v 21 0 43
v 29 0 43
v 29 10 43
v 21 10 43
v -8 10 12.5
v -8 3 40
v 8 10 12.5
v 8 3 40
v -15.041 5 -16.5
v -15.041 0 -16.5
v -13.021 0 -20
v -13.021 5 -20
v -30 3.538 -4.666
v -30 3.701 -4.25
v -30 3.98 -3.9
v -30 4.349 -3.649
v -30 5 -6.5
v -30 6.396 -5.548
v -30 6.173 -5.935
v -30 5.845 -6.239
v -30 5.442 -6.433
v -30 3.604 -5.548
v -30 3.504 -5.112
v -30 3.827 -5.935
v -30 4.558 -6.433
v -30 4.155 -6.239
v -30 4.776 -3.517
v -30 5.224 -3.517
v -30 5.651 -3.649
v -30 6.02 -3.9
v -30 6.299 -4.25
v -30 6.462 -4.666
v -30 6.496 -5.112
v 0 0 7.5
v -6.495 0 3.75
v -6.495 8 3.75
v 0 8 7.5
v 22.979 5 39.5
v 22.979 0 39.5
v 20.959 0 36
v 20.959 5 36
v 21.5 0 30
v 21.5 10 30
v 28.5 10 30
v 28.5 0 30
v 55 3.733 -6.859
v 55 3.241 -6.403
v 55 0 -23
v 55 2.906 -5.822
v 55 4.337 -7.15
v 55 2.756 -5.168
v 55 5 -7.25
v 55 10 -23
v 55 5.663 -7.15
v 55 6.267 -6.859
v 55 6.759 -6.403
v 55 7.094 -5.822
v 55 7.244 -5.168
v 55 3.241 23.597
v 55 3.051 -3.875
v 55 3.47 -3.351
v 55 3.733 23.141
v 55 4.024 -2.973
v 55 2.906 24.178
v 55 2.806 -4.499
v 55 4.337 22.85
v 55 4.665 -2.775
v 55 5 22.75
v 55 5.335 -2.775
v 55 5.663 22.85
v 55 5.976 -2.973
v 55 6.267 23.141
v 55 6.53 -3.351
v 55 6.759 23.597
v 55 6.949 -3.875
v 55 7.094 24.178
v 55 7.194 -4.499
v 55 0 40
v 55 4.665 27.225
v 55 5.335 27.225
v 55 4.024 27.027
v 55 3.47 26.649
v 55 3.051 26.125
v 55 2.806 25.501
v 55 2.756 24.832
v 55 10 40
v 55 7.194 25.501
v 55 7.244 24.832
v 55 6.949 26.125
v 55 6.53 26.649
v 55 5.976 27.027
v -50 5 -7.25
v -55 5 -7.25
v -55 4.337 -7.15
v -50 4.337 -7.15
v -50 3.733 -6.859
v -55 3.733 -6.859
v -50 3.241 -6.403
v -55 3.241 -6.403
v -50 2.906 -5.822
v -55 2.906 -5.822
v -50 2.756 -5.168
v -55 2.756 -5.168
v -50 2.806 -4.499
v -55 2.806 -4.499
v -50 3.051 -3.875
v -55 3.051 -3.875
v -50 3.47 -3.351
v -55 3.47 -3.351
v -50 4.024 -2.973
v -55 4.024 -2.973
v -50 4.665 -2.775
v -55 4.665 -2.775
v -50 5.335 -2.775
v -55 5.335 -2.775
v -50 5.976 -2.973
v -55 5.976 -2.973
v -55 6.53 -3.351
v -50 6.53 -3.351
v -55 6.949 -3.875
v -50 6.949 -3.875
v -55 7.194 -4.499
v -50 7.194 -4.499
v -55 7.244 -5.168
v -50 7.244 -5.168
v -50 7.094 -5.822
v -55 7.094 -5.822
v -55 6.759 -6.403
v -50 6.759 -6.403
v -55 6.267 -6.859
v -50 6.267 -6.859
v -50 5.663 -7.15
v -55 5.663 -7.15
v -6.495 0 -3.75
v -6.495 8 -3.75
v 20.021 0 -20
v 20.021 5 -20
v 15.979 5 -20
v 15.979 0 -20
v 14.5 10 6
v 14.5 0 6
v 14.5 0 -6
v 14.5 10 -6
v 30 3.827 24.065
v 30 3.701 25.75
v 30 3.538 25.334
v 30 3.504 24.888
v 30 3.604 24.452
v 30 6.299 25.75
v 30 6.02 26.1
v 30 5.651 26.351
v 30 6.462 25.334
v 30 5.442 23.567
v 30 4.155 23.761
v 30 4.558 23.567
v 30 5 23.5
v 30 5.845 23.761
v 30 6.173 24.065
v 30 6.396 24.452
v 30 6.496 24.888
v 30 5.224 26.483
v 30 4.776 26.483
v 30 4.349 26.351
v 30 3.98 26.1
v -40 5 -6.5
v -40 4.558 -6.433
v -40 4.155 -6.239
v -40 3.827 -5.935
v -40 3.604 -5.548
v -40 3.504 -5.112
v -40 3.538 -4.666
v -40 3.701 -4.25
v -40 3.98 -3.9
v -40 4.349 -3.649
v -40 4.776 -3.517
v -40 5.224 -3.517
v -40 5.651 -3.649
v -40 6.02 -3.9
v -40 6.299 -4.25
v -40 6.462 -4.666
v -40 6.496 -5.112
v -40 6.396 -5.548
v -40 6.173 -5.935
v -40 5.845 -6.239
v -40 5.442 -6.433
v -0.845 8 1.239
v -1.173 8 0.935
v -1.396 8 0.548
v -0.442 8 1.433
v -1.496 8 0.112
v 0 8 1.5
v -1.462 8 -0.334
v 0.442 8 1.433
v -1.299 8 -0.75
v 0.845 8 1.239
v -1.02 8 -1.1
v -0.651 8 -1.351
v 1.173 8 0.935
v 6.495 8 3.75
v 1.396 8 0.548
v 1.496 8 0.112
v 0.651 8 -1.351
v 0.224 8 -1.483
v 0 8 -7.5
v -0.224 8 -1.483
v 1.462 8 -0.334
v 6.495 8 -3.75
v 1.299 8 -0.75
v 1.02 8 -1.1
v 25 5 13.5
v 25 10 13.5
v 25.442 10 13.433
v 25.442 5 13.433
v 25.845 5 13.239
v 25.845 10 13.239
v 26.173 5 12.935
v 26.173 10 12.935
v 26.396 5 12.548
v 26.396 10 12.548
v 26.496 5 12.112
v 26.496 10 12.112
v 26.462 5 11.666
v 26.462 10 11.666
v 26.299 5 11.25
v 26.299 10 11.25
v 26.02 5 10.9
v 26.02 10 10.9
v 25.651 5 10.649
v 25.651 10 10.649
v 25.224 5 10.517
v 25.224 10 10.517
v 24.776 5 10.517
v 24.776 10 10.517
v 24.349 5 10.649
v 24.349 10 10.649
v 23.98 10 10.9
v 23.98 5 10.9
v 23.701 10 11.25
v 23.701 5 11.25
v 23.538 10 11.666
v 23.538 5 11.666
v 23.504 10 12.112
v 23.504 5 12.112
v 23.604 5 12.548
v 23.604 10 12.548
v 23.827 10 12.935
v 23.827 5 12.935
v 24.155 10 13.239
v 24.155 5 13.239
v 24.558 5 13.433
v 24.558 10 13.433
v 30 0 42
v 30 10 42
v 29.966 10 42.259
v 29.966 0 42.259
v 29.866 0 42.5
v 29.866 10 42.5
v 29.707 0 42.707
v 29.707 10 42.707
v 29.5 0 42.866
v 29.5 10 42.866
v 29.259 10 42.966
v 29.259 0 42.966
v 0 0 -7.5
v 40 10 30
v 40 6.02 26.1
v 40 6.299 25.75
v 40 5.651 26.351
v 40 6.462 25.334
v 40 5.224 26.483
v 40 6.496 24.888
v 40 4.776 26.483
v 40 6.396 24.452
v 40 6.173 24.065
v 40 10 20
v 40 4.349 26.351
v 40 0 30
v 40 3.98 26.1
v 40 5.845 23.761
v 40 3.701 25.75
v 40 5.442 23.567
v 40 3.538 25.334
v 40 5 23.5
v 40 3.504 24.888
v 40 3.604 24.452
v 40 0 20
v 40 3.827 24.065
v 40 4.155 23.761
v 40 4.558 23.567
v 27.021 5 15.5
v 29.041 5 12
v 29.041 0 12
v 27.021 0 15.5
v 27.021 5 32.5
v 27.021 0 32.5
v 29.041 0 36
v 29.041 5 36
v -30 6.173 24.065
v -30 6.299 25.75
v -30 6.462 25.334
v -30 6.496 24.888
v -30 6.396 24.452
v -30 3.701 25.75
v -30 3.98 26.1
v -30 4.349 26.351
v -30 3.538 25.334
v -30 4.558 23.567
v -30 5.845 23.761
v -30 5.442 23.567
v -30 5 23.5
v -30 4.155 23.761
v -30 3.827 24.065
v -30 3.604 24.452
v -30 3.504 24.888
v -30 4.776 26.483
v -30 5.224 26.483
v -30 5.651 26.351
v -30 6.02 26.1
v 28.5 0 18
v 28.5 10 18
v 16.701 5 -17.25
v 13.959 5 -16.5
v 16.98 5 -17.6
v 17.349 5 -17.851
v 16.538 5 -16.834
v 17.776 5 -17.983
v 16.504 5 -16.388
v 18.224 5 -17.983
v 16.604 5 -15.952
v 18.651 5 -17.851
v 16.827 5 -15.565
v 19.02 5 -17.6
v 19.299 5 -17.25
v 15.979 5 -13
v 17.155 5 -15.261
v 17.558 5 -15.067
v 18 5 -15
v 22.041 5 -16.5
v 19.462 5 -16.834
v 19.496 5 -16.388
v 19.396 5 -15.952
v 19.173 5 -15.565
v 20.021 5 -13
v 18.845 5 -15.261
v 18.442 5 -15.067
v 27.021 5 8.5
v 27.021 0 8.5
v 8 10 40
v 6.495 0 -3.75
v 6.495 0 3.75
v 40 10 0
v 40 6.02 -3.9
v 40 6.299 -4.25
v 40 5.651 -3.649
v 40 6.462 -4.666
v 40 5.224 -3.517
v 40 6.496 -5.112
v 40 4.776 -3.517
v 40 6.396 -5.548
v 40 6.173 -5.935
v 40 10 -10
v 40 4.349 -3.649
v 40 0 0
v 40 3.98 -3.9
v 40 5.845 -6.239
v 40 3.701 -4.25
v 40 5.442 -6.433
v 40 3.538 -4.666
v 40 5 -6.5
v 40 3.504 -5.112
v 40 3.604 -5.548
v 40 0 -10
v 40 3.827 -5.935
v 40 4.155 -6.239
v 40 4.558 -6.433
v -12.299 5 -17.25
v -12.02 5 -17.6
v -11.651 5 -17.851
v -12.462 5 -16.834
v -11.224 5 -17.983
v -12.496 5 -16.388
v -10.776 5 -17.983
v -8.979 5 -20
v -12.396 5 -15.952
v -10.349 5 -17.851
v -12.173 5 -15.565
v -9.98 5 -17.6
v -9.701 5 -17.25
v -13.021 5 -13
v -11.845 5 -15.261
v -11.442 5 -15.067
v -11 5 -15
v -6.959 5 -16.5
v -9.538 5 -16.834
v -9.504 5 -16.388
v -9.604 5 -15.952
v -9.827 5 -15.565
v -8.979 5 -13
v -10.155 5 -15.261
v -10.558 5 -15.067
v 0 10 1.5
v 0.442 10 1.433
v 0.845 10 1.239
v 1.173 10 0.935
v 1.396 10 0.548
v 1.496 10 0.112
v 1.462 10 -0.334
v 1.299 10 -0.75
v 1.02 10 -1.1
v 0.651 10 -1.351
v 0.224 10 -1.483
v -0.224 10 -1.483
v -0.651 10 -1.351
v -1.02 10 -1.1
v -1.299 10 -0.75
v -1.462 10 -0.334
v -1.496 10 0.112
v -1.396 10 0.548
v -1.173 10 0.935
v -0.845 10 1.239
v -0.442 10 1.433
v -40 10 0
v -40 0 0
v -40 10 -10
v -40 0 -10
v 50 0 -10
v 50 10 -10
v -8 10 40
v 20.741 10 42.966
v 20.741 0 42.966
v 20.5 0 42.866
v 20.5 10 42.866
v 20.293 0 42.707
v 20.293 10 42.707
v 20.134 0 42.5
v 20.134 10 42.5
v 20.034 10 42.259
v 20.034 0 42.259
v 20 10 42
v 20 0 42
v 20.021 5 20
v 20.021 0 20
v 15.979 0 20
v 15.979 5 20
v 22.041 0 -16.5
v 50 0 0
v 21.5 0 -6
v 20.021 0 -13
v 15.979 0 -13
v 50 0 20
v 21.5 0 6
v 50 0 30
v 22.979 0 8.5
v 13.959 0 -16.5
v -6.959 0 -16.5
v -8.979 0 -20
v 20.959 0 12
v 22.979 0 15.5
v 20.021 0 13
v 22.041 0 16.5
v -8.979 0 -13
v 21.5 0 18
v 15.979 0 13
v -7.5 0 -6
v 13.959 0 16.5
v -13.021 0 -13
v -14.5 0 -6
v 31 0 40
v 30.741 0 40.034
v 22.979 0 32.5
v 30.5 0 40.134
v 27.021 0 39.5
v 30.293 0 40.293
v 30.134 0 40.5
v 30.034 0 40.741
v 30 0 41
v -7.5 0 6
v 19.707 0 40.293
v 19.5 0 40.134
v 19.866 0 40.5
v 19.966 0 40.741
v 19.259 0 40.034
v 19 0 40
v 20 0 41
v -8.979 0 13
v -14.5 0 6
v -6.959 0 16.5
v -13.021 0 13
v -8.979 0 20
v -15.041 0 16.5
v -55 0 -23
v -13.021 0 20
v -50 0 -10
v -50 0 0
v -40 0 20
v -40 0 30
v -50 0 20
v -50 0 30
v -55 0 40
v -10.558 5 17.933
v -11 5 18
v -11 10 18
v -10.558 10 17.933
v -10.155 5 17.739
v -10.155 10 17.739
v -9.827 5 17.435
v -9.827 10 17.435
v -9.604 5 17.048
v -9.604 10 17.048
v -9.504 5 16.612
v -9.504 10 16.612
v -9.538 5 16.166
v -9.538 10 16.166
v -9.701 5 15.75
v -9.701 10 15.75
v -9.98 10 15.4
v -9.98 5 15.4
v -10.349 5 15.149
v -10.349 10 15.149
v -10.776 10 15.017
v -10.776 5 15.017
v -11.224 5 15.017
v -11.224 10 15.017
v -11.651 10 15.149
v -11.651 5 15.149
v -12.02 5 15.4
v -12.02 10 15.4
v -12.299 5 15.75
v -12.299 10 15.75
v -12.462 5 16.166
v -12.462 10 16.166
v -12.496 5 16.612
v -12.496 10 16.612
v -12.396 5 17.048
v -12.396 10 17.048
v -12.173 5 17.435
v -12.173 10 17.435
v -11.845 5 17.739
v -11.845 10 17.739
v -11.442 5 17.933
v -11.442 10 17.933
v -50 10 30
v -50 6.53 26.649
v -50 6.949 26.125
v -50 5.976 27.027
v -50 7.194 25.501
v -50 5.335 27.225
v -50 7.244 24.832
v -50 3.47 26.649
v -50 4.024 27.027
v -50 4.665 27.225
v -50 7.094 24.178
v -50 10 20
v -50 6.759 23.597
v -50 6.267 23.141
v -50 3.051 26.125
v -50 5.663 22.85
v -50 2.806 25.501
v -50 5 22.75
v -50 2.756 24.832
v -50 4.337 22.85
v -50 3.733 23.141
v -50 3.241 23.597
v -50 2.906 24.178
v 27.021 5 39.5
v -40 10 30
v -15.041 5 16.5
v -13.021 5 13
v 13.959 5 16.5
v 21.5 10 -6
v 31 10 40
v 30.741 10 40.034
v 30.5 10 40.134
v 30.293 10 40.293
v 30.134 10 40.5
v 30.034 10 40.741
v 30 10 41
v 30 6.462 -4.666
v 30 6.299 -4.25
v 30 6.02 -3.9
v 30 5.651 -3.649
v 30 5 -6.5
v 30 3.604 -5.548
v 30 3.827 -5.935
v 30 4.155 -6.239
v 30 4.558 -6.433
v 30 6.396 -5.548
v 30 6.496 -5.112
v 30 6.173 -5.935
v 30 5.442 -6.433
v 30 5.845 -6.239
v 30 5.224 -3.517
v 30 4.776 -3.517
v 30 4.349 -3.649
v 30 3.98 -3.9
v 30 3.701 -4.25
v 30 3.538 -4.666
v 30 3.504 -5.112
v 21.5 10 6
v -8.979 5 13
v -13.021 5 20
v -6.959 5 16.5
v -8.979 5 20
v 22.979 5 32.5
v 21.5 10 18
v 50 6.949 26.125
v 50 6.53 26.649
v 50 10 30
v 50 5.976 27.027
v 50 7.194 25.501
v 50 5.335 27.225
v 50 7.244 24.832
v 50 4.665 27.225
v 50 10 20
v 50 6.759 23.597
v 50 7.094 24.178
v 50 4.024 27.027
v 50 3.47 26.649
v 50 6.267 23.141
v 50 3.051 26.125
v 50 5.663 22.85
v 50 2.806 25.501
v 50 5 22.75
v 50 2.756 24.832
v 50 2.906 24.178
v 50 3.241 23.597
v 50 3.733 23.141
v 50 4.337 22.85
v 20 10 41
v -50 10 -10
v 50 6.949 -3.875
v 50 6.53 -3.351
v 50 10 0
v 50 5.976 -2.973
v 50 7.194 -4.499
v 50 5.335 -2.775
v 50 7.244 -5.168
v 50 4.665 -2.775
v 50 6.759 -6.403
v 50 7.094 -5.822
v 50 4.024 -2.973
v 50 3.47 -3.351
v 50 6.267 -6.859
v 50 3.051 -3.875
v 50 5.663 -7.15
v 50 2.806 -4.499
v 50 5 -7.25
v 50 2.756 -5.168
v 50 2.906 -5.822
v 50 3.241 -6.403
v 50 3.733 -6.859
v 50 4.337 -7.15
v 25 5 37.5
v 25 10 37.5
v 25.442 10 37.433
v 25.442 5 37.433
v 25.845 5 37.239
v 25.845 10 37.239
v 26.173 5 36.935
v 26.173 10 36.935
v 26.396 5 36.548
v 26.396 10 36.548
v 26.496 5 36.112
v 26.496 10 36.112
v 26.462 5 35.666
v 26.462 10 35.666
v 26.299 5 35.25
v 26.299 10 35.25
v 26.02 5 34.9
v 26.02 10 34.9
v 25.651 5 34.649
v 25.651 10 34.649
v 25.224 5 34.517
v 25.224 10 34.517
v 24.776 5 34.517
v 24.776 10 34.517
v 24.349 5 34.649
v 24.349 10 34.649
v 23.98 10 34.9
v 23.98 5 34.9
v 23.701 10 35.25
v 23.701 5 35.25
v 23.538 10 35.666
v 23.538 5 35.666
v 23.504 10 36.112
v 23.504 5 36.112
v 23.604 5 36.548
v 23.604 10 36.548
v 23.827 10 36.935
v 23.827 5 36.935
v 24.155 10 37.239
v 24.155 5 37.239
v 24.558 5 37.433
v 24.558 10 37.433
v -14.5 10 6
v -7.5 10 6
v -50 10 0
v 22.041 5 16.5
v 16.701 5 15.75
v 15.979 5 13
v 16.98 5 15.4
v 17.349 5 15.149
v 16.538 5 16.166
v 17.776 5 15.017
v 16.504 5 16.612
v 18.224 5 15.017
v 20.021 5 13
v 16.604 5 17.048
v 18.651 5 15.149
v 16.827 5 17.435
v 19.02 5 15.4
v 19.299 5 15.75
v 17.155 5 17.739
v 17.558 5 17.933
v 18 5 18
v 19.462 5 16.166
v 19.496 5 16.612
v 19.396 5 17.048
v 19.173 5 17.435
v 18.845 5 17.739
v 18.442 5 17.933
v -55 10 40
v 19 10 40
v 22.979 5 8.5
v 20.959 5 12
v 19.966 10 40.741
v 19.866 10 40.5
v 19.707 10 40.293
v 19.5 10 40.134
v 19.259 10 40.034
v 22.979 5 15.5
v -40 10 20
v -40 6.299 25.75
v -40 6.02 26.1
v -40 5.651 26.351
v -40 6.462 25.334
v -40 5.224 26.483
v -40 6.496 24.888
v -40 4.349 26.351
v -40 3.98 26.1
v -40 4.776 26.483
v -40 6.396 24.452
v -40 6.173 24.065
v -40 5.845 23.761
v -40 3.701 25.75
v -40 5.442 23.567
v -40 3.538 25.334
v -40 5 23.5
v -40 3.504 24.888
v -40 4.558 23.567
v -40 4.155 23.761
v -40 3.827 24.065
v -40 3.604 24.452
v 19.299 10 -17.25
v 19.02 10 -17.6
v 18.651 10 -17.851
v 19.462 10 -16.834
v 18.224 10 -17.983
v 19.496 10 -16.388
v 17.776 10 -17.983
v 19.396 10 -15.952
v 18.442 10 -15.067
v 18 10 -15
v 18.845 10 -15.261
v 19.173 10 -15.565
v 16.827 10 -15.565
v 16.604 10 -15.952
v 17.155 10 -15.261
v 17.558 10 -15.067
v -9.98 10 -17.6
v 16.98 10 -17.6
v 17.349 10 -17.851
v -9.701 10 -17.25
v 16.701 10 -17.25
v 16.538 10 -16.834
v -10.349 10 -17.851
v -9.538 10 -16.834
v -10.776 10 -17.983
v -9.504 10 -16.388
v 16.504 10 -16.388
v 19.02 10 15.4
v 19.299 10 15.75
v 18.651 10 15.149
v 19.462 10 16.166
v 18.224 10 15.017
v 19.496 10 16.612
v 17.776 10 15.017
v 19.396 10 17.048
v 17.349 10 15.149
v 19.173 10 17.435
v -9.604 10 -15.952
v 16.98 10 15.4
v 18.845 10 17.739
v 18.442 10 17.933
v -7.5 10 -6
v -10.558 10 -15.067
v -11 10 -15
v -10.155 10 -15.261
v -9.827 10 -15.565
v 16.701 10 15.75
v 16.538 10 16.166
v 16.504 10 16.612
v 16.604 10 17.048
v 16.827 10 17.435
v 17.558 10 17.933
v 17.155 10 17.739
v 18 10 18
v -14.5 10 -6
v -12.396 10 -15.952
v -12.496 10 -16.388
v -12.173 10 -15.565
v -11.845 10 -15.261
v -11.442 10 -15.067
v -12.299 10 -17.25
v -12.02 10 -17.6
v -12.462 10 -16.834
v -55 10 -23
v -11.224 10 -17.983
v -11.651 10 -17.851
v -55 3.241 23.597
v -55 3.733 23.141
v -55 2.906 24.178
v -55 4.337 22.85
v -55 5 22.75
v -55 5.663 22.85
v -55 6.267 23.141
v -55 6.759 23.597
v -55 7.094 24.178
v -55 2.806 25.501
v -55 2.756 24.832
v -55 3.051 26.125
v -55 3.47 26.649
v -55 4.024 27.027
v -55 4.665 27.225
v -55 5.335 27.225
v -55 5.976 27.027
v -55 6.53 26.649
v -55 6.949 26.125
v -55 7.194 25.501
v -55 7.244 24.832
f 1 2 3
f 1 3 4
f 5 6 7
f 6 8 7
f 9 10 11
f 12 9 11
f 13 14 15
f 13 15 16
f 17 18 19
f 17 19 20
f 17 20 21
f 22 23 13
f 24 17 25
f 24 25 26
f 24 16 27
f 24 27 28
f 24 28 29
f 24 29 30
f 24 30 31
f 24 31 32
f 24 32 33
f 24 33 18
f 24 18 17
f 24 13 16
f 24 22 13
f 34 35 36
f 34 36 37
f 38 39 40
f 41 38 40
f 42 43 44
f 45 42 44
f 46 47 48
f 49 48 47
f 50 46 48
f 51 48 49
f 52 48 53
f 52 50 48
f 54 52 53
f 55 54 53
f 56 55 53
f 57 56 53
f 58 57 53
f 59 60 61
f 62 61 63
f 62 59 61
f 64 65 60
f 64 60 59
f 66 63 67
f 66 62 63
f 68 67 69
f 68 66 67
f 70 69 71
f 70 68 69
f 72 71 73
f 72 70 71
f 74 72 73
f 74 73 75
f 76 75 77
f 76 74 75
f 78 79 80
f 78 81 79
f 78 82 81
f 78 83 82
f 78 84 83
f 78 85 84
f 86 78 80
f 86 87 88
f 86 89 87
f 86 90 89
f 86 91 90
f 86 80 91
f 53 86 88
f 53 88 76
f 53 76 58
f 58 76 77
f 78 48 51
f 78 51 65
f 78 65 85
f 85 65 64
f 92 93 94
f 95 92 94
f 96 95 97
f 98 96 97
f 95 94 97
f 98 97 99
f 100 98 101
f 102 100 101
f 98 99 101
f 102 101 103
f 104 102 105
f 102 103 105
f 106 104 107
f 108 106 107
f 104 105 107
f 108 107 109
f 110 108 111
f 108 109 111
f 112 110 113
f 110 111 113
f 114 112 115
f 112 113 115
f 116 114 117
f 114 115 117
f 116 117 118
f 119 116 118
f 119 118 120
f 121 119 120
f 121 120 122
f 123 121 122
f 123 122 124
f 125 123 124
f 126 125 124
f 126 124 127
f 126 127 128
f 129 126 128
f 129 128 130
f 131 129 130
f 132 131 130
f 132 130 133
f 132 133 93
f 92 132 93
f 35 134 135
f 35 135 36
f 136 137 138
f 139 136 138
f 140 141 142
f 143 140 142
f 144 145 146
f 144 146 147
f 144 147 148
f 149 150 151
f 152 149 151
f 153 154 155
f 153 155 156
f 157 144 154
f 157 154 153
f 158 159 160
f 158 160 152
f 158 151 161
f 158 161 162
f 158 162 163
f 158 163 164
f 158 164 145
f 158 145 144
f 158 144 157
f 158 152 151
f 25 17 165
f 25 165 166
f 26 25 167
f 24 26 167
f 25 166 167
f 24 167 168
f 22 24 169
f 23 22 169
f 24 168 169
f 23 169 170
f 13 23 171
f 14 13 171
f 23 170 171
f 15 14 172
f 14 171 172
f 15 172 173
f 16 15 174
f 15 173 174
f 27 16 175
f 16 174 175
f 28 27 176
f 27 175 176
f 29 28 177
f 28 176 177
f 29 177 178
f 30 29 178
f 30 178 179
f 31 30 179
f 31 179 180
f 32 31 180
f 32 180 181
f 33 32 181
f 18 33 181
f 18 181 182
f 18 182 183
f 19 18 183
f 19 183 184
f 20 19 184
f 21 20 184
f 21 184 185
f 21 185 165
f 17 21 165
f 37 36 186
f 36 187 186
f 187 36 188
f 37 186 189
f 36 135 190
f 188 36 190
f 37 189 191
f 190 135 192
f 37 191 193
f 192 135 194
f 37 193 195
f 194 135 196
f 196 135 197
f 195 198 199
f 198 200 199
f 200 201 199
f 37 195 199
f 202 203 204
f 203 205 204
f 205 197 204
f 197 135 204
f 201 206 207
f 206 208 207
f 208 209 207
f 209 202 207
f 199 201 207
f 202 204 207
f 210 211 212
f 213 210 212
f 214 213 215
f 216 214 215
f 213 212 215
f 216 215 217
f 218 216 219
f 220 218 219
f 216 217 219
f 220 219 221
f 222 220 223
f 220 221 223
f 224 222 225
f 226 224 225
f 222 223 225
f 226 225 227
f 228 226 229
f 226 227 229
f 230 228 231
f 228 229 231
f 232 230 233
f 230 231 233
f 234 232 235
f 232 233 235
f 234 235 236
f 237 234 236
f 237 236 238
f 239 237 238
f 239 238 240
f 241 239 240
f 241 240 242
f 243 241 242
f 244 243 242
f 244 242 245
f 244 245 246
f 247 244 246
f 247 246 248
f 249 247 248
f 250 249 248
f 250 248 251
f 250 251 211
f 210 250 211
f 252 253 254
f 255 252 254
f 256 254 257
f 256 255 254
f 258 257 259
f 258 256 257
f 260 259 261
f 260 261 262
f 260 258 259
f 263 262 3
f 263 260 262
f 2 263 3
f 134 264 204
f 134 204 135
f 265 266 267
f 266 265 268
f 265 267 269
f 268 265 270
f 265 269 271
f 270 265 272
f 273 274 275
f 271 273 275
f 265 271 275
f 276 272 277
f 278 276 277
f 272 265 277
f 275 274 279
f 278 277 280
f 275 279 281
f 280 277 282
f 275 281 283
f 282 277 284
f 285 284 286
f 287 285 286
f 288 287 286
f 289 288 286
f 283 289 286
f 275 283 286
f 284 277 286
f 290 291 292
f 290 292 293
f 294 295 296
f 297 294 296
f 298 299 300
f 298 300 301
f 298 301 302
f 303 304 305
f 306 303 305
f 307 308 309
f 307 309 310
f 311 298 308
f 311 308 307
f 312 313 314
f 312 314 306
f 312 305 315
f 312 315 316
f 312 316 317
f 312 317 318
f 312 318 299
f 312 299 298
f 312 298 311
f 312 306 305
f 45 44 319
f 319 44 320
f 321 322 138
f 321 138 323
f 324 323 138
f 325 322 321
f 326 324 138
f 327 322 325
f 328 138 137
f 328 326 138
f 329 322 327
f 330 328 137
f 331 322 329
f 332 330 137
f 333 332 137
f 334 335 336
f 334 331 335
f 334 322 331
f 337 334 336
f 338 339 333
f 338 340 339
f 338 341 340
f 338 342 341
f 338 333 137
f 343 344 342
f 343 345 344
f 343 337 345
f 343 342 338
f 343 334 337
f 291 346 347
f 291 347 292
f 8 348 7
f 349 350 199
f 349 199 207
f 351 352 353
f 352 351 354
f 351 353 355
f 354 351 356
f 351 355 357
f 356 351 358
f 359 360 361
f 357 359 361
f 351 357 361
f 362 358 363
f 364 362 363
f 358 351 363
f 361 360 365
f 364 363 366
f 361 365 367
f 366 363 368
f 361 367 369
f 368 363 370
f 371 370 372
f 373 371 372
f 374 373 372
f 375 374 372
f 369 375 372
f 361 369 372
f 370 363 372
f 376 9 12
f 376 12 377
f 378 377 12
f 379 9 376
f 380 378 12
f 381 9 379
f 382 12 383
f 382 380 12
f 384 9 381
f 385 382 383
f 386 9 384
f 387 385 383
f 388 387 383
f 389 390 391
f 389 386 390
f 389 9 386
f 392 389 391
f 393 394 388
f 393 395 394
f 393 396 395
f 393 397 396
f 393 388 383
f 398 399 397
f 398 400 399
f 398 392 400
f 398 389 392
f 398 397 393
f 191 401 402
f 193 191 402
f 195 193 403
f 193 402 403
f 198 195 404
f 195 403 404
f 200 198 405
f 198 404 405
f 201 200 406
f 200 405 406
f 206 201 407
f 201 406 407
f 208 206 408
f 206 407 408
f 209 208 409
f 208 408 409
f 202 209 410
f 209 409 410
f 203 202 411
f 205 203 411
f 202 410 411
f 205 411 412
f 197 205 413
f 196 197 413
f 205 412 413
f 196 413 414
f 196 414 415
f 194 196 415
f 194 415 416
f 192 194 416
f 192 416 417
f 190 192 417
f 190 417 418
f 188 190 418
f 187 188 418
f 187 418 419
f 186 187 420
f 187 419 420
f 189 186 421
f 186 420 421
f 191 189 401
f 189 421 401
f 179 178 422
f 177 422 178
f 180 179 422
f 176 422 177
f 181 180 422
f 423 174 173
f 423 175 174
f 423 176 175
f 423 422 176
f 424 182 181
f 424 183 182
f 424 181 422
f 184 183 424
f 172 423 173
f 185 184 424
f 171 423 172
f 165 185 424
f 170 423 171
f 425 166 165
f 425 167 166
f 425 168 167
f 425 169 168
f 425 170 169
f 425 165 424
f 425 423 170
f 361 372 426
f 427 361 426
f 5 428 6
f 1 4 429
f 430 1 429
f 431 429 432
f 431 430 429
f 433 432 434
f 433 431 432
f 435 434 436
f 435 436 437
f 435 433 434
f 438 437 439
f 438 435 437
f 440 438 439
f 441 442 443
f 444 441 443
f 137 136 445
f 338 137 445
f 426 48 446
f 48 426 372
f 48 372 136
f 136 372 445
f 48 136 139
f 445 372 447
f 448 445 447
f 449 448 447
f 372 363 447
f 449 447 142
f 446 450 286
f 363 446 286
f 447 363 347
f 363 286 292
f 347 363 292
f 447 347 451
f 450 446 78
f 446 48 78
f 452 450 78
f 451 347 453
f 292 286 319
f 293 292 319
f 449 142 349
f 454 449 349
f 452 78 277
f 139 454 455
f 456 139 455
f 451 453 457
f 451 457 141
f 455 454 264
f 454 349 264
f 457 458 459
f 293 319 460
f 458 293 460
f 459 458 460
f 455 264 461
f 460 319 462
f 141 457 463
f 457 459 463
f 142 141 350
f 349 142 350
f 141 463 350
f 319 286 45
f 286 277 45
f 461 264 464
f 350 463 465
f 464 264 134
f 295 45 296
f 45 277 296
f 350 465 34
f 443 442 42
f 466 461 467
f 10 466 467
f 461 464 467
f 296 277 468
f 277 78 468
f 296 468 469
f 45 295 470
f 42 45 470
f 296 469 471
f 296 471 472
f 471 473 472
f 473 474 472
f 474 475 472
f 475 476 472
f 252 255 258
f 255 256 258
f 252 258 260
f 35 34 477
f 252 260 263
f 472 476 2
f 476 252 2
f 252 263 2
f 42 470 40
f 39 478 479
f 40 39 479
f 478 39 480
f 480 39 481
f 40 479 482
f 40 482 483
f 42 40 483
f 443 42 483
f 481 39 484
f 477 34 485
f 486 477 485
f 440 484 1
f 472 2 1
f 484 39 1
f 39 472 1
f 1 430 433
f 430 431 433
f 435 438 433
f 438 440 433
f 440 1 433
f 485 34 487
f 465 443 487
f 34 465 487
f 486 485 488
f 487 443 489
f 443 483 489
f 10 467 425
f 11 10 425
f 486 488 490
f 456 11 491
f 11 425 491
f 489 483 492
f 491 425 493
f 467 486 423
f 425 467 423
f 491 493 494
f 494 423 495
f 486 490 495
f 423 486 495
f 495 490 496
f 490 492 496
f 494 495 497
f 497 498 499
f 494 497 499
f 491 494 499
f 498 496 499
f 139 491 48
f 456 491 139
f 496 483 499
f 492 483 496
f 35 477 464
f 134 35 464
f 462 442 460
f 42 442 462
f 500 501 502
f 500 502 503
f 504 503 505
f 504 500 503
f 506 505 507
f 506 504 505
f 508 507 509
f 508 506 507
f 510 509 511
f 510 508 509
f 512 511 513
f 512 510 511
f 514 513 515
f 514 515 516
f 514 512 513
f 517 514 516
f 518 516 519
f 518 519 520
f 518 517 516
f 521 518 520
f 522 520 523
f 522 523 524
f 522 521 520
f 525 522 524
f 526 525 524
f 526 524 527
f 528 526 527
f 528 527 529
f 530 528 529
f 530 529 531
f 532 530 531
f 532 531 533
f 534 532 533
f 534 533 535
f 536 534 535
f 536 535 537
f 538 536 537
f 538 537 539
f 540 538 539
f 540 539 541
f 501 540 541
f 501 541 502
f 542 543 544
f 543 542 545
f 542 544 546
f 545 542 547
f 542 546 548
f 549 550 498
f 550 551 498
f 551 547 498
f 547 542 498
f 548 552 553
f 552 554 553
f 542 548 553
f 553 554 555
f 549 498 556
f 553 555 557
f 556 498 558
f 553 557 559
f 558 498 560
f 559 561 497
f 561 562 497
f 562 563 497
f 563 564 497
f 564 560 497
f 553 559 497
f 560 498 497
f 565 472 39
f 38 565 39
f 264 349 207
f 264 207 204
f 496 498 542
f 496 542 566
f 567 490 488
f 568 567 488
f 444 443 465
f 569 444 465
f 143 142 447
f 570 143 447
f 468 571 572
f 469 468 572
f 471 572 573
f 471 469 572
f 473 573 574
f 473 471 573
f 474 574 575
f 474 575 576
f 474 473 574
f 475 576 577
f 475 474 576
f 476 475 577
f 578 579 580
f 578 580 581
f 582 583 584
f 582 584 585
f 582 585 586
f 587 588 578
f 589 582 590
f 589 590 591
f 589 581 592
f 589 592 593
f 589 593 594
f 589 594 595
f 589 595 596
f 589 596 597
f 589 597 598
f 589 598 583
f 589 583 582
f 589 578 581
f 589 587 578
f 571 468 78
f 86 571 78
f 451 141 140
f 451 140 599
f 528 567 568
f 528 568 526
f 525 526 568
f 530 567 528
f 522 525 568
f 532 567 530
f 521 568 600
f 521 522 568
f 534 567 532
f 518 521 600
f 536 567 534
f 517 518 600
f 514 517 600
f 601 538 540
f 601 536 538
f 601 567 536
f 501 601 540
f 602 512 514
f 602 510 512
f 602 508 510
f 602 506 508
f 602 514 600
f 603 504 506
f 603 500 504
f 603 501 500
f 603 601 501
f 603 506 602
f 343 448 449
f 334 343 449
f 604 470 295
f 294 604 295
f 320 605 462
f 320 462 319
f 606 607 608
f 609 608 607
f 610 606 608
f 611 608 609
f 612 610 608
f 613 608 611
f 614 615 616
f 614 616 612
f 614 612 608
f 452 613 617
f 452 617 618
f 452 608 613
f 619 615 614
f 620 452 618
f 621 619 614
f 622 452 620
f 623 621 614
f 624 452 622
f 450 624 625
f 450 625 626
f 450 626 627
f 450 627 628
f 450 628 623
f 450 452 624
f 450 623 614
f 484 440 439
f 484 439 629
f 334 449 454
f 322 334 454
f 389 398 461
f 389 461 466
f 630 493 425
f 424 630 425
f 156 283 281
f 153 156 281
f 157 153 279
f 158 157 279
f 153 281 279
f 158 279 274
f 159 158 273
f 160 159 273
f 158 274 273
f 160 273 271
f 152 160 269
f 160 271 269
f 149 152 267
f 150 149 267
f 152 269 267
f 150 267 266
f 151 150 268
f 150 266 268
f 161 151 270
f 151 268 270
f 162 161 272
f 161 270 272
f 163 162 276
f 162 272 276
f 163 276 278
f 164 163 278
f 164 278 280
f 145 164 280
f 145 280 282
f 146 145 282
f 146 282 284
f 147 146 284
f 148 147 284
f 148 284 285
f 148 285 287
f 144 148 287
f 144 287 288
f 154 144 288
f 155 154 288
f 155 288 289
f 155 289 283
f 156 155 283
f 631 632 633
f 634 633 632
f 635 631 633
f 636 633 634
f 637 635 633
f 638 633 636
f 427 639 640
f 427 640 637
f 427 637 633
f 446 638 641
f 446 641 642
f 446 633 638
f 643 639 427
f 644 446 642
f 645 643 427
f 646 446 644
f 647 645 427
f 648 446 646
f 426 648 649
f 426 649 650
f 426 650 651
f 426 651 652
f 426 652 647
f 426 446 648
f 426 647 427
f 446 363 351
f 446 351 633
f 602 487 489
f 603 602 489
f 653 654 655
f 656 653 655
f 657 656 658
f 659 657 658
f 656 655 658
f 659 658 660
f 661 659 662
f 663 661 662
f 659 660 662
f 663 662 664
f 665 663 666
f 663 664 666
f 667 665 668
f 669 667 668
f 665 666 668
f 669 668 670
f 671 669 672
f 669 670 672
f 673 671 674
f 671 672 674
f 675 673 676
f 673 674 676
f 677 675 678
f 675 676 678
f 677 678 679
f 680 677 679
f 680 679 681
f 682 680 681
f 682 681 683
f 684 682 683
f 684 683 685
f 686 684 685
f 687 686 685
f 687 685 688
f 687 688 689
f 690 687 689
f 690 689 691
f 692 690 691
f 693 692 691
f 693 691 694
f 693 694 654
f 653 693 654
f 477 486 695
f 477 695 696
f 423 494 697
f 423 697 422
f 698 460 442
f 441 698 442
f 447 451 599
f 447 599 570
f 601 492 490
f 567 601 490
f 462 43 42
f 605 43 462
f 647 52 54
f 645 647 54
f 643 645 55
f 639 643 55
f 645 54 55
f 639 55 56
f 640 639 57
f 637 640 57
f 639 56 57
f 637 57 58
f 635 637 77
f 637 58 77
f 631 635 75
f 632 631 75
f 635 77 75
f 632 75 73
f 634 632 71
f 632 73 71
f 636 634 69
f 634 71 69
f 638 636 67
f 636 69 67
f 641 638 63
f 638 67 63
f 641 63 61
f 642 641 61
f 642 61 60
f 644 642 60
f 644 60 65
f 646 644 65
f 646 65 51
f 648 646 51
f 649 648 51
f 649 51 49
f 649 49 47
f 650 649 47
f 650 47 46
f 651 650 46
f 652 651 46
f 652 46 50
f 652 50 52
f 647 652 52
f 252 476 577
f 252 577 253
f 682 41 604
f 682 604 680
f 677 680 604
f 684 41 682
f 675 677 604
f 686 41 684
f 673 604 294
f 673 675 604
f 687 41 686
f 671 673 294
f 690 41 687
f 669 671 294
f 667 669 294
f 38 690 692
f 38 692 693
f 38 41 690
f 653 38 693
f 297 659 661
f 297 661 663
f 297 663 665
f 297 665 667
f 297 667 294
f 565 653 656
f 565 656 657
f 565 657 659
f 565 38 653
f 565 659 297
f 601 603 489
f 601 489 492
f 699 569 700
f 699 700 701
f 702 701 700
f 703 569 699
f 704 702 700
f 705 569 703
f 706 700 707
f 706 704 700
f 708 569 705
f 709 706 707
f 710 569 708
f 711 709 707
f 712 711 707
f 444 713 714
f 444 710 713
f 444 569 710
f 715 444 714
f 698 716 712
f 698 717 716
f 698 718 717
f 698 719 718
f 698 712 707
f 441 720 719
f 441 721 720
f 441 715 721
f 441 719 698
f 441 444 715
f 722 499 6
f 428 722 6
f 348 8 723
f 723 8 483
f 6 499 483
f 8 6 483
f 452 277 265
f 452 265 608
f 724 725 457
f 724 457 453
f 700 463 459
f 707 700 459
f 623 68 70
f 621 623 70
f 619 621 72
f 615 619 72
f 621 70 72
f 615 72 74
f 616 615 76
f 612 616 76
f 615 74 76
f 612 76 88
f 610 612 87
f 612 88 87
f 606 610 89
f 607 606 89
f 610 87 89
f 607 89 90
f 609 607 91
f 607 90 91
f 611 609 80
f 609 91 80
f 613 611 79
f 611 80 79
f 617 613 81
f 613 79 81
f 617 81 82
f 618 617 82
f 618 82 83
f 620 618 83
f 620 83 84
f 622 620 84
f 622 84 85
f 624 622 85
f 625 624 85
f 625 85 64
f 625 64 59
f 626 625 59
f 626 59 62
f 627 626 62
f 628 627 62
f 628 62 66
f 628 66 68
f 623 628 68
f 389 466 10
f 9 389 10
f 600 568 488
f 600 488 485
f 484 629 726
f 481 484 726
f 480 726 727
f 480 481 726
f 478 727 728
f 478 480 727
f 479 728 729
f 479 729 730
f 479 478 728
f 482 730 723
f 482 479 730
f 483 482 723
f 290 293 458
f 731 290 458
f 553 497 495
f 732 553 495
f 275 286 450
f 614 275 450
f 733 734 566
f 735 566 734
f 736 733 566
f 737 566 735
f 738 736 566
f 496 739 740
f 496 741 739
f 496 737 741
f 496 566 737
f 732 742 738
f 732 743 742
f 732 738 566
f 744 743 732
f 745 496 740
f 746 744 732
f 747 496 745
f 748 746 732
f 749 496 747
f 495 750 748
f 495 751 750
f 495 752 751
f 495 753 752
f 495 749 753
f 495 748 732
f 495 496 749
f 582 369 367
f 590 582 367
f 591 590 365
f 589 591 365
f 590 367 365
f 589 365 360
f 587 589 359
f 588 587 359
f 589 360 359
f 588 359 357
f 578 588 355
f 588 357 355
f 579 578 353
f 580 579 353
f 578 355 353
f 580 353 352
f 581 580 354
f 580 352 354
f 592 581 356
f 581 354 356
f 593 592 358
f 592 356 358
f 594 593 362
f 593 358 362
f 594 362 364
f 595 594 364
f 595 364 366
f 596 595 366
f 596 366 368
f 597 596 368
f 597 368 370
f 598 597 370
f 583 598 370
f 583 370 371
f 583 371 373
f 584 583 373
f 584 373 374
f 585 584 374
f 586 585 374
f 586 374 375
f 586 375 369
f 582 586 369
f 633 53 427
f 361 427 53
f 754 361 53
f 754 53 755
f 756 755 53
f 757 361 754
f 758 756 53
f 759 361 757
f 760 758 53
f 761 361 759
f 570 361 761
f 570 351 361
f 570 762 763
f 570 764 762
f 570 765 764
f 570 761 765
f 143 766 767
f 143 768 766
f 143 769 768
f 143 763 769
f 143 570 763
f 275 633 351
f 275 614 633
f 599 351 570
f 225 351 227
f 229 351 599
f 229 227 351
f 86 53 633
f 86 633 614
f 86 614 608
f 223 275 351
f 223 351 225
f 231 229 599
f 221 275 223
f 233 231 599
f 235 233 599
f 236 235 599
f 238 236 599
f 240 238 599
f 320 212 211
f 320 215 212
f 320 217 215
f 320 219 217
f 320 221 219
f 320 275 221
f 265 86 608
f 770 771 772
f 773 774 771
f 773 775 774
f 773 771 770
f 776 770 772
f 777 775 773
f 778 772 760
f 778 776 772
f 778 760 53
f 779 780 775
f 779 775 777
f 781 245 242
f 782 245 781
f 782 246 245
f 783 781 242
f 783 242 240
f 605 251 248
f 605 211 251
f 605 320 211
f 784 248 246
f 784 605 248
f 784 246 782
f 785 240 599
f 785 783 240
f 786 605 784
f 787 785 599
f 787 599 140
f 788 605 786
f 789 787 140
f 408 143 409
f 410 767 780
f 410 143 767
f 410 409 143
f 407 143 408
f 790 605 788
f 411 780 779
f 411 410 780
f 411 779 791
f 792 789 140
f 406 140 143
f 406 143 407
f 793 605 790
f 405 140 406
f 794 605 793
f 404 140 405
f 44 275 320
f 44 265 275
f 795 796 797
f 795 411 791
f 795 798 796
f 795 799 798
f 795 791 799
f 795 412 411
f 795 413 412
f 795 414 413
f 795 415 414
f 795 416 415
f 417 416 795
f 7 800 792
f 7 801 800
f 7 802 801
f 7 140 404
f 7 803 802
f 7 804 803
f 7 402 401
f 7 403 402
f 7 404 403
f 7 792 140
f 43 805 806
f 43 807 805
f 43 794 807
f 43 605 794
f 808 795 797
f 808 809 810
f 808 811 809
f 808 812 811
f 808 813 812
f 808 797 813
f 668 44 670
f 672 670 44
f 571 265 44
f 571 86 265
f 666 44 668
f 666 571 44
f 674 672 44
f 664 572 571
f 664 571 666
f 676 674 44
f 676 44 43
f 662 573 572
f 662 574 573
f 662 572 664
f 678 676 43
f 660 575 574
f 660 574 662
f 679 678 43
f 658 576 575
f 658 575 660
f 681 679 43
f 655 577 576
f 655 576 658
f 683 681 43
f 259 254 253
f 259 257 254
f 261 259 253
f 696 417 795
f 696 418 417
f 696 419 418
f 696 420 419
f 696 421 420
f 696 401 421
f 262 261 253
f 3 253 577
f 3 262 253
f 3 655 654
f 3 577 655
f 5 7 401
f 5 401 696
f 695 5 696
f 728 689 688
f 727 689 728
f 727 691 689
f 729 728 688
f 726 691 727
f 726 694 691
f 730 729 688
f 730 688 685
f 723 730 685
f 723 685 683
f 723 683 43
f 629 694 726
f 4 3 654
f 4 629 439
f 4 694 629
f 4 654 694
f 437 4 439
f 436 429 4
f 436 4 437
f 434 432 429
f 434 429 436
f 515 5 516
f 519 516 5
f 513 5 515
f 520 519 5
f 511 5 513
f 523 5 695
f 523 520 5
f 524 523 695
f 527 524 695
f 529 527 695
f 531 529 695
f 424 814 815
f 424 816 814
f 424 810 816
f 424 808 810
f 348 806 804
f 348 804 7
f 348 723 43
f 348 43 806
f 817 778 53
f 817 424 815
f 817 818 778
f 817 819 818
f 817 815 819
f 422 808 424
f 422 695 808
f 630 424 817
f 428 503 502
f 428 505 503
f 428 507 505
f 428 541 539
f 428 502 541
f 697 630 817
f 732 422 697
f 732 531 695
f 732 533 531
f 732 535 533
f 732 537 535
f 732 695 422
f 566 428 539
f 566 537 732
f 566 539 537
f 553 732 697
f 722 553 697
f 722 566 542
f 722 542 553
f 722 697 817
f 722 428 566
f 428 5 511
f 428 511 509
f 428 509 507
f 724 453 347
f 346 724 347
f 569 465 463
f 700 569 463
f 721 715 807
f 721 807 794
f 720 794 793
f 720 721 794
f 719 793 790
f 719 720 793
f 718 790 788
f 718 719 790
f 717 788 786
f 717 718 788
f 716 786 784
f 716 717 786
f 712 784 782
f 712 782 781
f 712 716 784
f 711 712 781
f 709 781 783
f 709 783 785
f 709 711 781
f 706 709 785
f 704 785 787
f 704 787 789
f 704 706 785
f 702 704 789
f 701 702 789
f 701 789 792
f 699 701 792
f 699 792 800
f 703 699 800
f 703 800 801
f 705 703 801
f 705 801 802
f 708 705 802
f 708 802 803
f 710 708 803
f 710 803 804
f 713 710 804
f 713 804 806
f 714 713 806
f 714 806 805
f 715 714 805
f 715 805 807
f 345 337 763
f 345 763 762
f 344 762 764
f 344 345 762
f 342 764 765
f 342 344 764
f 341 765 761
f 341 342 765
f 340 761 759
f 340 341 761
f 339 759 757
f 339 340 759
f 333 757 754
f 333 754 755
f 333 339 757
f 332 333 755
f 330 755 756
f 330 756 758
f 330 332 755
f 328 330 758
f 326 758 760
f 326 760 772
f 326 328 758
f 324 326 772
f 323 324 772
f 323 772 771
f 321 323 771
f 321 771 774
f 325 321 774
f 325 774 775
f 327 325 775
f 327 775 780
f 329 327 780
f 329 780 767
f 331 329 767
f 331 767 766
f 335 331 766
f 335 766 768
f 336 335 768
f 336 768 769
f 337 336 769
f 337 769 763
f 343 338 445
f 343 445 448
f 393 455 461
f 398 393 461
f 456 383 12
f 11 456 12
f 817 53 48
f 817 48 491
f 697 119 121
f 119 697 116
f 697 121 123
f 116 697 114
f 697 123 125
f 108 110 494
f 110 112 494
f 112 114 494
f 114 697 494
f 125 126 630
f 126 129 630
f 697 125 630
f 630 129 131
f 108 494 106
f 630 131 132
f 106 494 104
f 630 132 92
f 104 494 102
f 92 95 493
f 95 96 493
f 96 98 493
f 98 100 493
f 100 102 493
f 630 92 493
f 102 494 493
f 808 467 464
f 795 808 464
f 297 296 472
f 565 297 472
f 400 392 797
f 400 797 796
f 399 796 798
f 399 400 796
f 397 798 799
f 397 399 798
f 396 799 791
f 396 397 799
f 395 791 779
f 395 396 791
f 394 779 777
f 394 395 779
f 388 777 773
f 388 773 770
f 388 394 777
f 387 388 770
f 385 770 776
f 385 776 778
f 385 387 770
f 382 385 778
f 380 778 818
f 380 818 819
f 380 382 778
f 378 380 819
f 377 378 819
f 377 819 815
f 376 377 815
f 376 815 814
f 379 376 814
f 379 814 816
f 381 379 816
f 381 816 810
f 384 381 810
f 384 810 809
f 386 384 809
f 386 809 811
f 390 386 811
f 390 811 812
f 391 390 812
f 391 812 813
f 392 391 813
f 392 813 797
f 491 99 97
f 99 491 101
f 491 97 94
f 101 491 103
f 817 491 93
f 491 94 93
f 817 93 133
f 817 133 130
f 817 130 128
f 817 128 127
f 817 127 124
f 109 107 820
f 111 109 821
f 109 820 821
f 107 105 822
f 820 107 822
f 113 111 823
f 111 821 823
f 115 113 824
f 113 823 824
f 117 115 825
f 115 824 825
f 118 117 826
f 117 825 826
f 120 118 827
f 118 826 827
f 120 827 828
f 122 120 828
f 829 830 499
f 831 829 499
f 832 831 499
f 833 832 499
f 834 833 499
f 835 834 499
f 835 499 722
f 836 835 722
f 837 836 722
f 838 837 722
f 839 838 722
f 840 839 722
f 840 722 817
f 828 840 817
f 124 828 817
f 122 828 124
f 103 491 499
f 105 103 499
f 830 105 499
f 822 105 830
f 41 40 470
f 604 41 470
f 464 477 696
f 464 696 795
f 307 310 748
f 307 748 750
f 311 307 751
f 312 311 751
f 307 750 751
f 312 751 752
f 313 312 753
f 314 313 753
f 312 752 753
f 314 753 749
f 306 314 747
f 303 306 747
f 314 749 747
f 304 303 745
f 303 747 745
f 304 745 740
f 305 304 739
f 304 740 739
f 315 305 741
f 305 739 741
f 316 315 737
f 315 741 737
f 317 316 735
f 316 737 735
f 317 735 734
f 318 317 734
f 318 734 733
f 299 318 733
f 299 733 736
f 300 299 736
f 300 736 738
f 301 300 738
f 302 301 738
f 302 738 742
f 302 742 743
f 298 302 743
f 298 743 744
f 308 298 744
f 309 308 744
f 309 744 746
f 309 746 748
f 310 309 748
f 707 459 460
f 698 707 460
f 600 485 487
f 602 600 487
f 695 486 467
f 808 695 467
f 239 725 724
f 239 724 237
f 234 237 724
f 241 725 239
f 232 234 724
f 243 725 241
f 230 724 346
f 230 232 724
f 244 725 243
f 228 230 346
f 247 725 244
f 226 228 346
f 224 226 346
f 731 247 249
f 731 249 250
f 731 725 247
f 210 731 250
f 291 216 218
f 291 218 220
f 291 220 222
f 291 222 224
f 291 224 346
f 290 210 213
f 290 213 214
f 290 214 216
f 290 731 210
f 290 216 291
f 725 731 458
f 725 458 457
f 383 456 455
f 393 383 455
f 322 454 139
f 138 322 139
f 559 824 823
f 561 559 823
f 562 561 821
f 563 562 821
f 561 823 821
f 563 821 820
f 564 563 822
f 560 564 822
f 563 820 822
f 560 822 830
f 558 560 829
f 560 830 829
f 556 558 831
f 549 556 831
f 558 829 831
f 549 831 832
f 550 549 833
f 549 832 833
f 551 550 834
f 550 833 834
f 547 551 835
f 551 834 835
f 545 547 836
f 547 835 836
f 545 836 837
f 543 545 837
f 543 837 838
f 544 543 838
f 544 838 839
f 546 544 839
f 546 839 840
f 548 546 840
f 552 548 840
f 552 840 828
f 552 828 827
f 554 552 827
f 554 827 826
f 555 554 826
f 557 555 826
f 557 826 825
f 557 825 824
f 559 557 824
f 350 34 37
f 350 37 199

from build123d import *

# Parameters (mm, degrees)
CROQUIS1_W              = 80
CROQUIS1_H              = 60
CROQUIS1_R              = 1.5
CROQUIS1_W_2            = 7
CROQUIS1_H_2            = 25
CROQUIS1_W_3            = 10
CROQUIS1_H_3            = 20
CROQUIS1_H_4            = 10
CROQUIS1_W_4            = 5
CROQUIS1_H_5            = 6.5
SALIENTE_EXTRUIR1_DEPTH = 10
CORTAR_EXTRUIR1_DEPTH   = 5
CROQUIS3_R              = 1.5
CORTAR_EXTRUIR2_DEPTH   = 25
CROQUIS6_R              = 1.5
CORTAR_EXTRUIR3_DEPTH   = 25
CROQUIS8_W              = 15
CROQUIS8_H              = 17.838651154
CROQUIS8_R              = 1.5
SALIENTE_EXTRUIR2_DEPTH = 2
CORTAR_EXTRUIR4_START   = -55
CORTAR_EXTRUIR4_DEPTH   = 8
CROQUIS10_R             = 1.5
CROQUIS10_W             = 7
CROQUIS10_H             = 12
CORTAR_EXTRUIR5_DEPTH   = 16
CROQUIS12_W             = 110
CROQUIS12_H             = 10
SALIENTE_EXTRUIR3_DEPTH = 3
CORTAR_EXTRUIR6_DEPTH   = 5
SALIENTE_EXTRUIR4_DEPTH = 10
CROQUIS15_R             = 2.25
CORTAR_EXTRUIR7_DEPTH   = 10
CROQUIS16_R             = 2.25
CORTAR_EXTRUIR8_DEPTH   = 10


with BuildPart() as part:
    # Croquis1 → Saliente-Extruir1 (new body)
    with BuildSketch(Plane(origin=(0, 0, 0), x_dir=(1, 0, 0), z_dir=(0, 1, 0))):
        with Locations((0, -10)):
            Rectangle(CROQUIS1_W, CROQUIS1_H)
        with Locations(Location((18, -16.5, 0), (0, 0, 270))):
            Circle(CROQUIS1_R, mode=Mode.SUBTRACT)
        with Locations(Location((-11, -16.5, 0), (0, 0, 270))):
            Circle(CROQUIS1_R, mode=Mode.SUBTRACT)
        with Locations(Location((18, 16.5, 0), (0, 0, 270))):
            Circle(CROQUIS1_R, mode=Mode.SUBTRACT)
        with Locations(Location((-11, 16.5, 0), (0, 0, 270))):
            Circle(CROQUIS1_R, mode=Mode.SUBTRACT)
        with Locations((18, 0)):
            Rectangle(CROQUIS1_W_2, CROQUIS1_H_2, mode=Mode.SUBTRACT)
        Polygon((6.495190528, 3.75), (0, 7.5), (-6.495190528, 3.75), (-6.495190528, -3.75), (0, -7.5), (6.495190528, -3.75), align=None, mode=Mode.SUBTRACT)
        with Locations((-11, 0)):
            Rectangle(CROQUIS1_W_2, CROQUIS1_H_2, mode=Mode.SUBTRACT)
        with Locations((-45, -10)):
            Rectangle(CROQUIS1_W_3, CROQUIS1_H_3)
        with Locations((-45, -35)):
            Rectangle(CROQUIS1_W_3, CROQUIS1_H_4)
        with Locations((-52.5, -10)):
            Rectangle(CROQUIS1_W_4, CROQUIS1_H)
        with Locations((-45, 15)):
            Rectangle(CROQUIS1_W_3, CROQUIS1_H_4)
        with Locations((45, 15)):
            Rectangle(CROQUIS1_W_3, CROQUIS1_H_4)
        with Locations((52.5, -10)):
            Rectangle(CROQUIS1_W_4, CROQUIS1_H)
        with Locations((45, -10)):
            Rectangle(CROQUIS1_W_3, CROQUIS1_H_3)
        with Locations((45, -35)):
            Rectangle(CROQUIS1_W_3, CROQUIS1_H_4)
        with Locations((-11, 9.25)):
            Rectangle(CROQUIS1_W_2, CROQUIS1_H_5)
        with Locations((-11, -9.25)):
            Rectangle(CROQUIS1_W_2, CROQUIS1_H_5)
        with Locations((18, 9.25)):
            Rectangle(CROQUIS1_W_2, CROQUIS1_H_5)
        with Locations((18, -9.25)):
            Rectangle(CROQUIS1_W_2, CROQUIS1_H_5)
    extrude(amount=SALIENTE_EXTRUIR1_DEPTH)

    # Croquis2 → Cortar-Extruir1 (cut)
    with BuildSketch(Plane.XZ):
        Polygon((-6.958548116, 16.5), (-8.979274058, 20), (-13.020725942, 20), (-15.041451884, 16.5), (-13.020725942, 13), (-8.979274058, 13), align=None)
        Polygon((22.041451884, 16.5), (20.020725942, 20), (15.979274058, 20), (13.958548116, 16.5), (15.979274058, 13), (20.020725942, 13), align=None)
        Polygon((-6.958548116, -16.5), (-8.979274058, -13), (-13.020725942, -13), (-15.041451884, -16.5), (-13.020725942, -20), (-8.979274058, -20), align=None)
        Polygon((22.041451884, -16.5), (20.020725942, -13), (15.979274058, -13), (13.958548116, -16.5), (15.979274058, -20), (20.020725942, -20), align=None)
    extrude(amount=-CORTAR_EXTRUIR1_DEPTH, mode=Mode.SUBTRACT)

    # Croquis3 → Cortar-Extruir2 (cut)
    with BuildSketch(Plane(origin=(55, 0, 0), x_dir=(0, 0, -1), z_dir=(1, 0, 0))):
        with Locations((-25, 5)):
            Circle(CROQUIS3_R)
        with Locations((5, 5)):
            Circle(CROQUIS3_R)
    extrude(amount=-CORTAR_EXTRUIR2_DEPTH, mode=Mode.SUBTRACT)

    # Croquis6 → Cortar-Extruir3 (cut)
    with BuildSketch(Plane.ZY.offset(55)):
        with Locations(Location((-5, 5, 0), (0, 0, 180))):
            Circle(CROQUIS6_R)
        with Locations(Location((25, 5, 0), (0, 0, 180))):
            Circle(CROQUIS6_R)
    extrude(amount=-CORTAR_EXTRUIR3_DEPTH, mode=Mode.SUBTRACT)

    # Croquis8 → Saliente-Extruir2 (add)
    with BuildSketch(Plane(origin=(0, 10, 0), x_dir=(1, 0, 0), z_dir=(0, 1, 0))):
        Rectangle(CROQUIS8_W, CROQUIS8_H)
        with Locations(Location((0, 0, 0), (0, 0, 270))):
            Circle(CROQUIS8_R, mode=Mode.SUBTRACT)
    extrude(amount=-SALIENTE_EXTRUIR2_DEPTH)

    # Croquis9 → Cortar-Extruir4 (cut, symmetric)
    with BuildSketch(Plane(origin=(55, 0, 0), x_dir=(0, 0, -1), z_dir=(1, 0, 0)).offset(CORTAR_EXTRUIR4_START)):
        Polygon((-40, 3), (-12.5, 10), (-40, 10), align=None)
    extrude(amount=CORTAR_EXTRUIR4_DEPTH, both=True, mode=Mode.SUBTRACT)

    # Croquis10 → Cortar-Extruir5 (cut)
    with BuildSketch(Plane(origin=(0, 10, 0), x_dir=(1, 0, 0), z_dir=(0, 1, 0))):
        with Locations(Location((25, -12, 0), (0, 0, 270))):
            Circle(CROQUIS10_R)
        with Locations(Location((25, -36, 0), (0, 0, 270))):
            Circle(CROQUIS10_R)
        with Locations((25, -24)):
            Rectangle(CROQUIS10_W, CROQUIS10_H)
    extrude(amount=-CORTAR_EXTRUIR5_DEPTH, mode=Mode.SUBTRACT)

    # Croquis12 → Saliente-Extruir3 (add)
    with BuildSketch(Plane(origin=(0, 0, -20), x_dir=(-1, 0, 0), z_dir=(0, 0, -1))):
        with Locations((0, 5)):
            Rectangle(CROQUIS12_W, CROQUIS12_H)
    extrude(amount=SALIENTE_EXTRUIR3_DEPTH)

    # Croquis13 → Cortar-Extruir6 (cut)
    with BuildSketch(Plane.XZ):
        Polygon((29.041451884, 12), (27.020725942, 15.5), (22.979274058, 15.5), (20.958548116, 12), (22.979274058, 8.5), (27.020725942, 8.5), align=None)
        Polygon((29.041451884, 36), (27.020725942, 39.5), (22.979274058, 39.5), (20.958548116, 36), (22.979274058, 32.5), (27.020725942, 32.5), align=None)
    extrude(amount=-CORTAR_EXTRUIR6_DEPTH, mode=Mode.SUBTRACT)

    # Croquis14 → Saliente-Extruir4 (add)
    with BuildSketch(Plane.XZ):
        with BuildLine():
            Line((30, 41), (30, 42))
            ThreePointArc((30, 42), (29.707106781, 42.707106781), (29, 43))
            Line((29, 43), (21, 43))
            ThreePointArc((21, 43), (20.292893219, 42.707106781), (20, 42))
            Line((20, 42), (20, 41))
            ThreePointArc((20, 41), (19.707106781, 40.292893219), (19, 40))
            Line((19, 40), (31, 40))
            ThreePointArc((31, 40), (30.292893219, 40.292893219), (30, 41))
        make_face()
    extrude(amount=-SALIENTE_EXTRUIR4_DEPTH)

    # Croquis15 → Cortar-Extruir7 (cut)
    with BuildSketch(Plane(origin=(55, 0, 0), x_dir=(0, 0, -1), z_dir=(1, 0, 0))):
        with Locations((-25, 5)):
            Circle(CROQUIS15_R)
        with Locations((5, 5)):
            Circle(CROQUIS15_R)
    extrude(amount=-CORTAR_EXTRUIR7_DEPTH, mode=Mode.SUBTRACT)

    # Croquis16 → Cortar-Extruir8 (cut)
    with BuildSketch(Plane.ZY.offset(55)):
        with Locations(Location((-5, 5, 0), (0, 0, 180))):
            Circle(CROQUIS16_R)
        with Locations(Location((25, 5, 0), (0, 0, 180))):
            Circle(CROQUIS16_R)
    extrude(amount=-CORTAR_EXTRUIR8_DEPTH, mode=Mode.SUBTRACT)


solid = part.part
